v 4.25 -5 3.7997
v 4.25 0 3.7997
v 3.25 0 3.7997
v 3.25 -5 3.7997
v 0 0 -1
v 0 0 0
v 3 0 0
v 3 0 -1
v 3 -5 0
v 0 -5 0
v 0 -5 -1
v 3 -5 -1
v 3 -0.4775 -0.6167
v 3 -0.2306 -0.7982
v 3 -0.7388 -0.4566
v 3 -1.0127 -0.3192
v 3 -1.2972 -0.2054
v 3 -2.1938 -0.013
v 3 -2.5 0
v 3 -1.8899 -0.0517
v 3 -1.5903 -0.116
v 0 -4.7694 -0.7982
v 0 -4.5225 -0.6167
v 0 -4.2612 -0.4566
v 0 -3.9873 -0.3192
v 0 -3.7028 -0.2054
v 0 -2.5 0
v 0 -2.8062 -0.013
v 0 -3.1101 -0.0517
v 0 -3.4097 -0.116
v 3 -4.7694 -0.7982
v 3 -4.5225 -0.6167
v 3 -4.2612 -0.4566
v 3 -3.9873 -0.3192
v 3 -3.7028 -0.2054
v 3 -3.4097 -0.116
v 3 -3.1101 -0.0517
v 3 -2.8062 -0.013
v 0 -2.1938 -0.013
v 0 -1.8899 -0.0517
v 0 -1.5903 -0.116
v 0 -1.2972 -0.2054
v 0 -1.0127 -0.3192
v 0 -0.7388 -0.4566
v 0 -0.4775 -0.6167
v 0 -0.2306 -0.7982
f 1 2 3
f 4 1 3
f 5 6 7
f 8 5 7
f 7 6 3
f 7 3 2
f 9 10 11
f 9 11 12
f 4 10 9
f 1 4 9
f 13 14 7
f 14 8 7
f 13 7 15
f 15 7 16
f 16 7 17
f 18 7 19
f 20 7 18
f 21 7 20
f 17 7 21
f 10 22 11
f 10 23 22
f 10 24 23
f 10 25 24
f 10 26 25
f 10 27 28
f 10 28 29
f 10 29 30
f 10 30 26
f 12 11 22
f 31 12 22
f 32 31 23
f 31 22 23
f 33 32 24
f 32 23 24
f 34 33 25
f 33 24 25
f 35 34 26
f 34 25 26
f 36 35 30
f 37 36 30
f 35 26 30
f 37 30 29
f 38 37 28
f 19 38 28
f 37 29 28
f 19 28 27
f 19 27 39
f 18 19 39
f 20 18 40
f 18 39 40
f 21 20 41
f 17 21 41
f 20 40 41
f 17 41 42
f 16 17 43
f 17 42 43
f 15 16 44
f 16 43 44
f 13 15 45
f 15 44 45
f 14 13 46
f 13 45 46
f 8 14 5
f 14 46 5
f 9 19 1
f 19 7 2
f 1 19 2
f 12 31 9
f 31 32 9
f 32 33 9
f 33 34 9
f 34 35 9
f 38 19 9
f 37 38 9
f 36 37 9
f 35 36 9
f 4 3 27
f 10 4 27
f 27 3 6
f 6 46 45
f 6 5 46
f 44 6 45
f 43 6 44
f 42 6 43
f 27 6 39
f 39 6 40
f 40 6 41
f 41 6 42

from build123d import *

# Parameters (mm, degrees)
F1_DEPTH = 5
F2_DEPTH = 1
F4_DEPTH = 25


with BuildPart() as f1:
    # F0 (on Front) → F1 (new body)
    with BuildSketch(Plane.XZ):
        Polygon((3.25, 3.7996710384), (0, 0), (3, 0), (4.25, 3.7996710384), align=None)
    extrude(amount=F1_DEPTH)

    # F2 (add): a face of the model
    f2_faces = [f1.faces().sort_by_distance(p)[0] for p in [
        (1.5, -2.5, 0),
    ]]
    extrude(f2_faces, amount=F2_DEPTH)

    # F3 (on face) → F4 (cut)
    with BuildSketch(Plane(origin=(0, 0, 0), x_dir=(0, -1, 0), z_dir=(-1, 0, 0))):
        with BuildLine():
            Line((0, -1), (5, -1))
            ThreePointArc((5, -1), (3.8462912018, -0.2592719955), (2.5, 0))
            ThreePointArc((2.5, 0), (1.1537087982, -0.2592719955), (0, -1))
        make_face()
    extrude(amount=-F4_DEPTH, mode=Mode.SUBTRACT)


solid = f1.part
